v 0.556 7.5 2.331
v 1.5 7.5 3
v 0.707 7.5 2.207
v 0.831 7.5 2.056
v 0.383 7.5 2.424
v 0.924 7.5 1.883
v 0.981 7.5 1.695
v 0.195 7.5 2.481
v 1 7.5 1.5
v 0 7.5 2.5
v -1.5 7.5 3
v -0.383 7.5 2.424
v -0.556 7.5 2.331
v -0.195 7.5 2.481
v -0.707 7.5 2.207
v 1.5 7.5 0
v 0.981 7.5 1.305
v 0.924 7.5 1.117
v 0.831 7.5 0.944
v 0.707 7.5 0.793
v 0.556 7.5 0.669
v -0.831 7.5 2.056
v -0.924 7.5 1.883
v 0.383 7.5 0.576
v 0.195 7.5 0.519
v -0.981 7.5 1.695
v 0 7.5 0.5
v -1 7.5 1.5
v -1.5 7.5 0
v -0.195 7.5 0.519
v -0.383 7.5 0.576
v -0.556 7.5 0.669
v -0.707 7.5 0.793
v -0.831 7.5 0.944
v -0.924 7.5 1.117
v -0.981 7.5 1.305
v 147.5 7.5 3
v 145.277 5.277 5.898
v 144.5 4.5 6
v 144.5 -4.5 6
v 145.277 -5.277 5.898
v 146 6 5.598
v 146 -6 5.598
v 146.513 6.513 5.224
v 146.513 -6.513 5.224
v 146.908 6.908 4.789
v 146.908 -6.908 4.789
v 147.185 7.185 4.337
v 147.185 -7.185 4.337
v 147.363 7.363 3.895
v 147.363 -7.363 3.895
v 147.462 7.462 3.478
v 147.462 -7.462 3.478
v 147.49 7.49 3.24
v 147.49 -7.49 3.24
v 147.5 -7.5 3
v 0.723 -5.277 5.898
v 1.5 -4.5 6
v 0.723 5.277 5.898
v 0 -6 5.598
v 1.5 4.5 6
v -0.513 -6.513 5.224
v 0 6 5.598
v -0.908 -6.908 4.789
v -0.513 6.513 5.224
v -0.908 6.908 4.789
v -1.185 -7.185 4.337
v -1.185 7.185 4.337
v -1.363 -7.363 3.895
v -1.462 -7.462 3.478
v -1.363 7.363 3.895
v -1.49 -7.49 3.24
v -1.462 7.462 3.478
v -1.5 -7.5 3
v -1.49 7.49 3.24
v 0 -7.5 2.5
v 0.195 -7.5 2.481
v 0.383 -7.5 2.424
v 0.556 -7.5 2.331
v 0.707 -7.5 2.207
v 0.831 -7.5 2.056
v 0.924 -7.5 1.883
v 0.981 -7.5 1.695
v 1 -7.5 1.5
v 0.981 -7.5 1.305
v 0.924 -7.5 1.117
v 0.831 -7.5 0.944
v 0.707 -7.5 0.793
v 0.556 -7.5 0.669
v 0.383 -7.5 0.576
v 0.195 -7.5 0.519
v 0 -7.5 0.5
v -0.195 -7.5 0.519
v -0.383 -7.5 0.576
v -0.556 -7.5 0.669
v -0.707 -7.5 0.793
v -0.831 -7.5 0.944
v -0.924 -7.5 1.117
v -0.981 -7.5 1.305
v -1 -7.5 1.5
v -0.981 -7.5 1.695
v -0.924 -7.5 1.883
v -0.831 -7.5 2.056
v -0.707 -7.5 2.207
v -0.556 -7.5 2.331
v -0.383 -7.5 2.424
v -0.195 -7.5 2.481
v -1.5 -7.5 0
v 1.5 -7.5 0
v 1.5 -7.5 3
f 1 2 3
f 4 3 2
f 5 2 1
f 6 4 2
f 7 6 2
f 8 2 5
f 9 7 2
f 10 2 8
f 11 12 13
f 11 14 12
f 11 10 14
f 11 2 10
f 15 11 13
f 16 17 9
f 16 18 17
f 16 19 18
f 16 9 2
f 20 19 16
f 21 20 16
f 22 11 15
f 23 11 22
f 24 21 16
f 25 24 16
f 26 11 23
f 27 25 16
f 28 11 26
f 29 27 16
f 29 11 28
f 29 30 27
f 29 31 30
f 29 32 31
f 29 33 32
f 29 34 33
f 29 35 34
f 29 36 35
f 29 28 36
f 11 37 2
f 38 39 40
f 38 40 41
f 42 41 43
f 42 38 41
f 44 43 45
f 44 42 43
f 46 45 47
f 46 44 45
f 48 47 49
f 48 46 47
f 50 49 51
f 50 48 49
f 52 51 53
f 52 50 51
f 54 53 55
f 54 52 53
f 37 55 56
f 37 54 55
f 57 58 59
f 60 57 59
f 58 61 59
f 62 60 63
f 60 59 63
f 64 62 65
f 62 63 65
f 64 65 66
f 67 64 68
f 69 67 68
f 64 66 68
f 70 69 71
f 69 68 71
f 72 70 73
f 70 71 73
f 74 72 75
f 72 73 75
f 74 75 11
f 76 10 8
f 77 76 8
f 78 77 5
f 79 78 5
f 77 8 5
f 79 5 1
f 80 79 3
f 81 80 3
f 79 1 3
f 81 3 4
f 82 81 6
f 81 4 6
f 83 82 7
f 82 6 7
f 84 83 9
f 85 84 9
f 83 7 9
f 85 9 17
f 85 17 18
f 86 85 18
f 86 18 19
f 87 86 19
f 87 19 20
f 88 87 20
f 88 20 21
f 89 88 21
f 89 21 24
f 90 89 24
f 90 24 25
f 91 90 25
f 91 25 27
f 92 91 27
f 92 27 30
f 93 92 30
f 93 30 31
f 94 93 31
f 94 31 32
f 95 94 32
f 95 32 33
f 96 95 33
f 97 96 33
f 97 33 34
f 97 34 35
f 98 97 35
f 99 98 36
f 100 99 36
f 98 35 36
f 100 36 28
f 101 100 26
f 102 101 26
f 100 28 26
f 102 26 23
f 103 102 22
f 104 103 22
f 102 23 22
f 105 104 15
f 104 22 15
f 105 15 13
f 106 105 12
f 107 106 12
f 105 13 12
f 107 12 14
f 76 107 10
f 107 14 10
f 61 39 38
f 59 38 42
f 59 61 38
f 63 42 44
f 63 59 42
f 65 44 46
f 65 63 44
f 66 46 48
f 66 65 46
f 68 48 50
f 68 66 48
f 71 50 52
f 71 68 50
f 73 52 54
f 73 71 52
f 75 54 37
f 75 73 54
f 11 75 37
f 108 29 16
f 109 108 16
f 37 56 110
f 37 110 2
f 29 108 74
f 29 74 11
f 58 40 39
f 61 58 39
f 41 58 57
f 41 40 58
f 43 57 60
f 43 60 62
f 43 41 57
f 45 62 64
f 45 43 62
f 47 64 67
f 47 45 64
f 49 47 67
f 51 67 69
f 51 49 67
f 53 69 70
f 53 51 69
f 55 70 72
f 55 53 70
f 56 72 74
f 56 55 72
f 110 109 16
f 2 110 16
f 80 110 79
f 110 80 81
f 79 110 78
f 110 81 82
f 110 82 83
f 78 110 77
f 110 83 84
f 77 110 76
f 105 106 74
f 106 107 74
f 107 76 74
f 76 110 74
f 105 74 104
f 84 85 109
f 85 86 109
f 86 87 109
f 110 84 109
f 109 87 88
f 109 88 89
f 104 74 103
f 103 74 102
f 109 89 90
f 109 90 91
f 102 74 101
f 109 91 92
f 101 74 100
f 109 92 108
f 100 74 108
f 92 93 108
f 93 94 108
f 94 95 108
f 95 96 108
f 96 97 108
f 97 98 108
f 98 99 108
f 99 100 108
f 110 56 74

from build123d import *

# Parameters (mm, degrees)
SKETCH_1_W          = 3
SKETCH_1_H          = 15
EXTRUDE_1_DEPTH     = 6
SKETCH_2_W          = 3
SKETCH_2_H          = 15
EXTRUDE_2_DEPTH     = 146
SKETCH_3_R          = 1
CUT_EXTRUDE_1_DEPTH = 146
FILLET_1_R          = 3


with BuildPart() as part:
    # 草图1 → 凸台-拉伸1 (new body)
    with BuildSketch(Plane.XY):
        Rectangle(SKETCH_1_W, SKETCH_1_H)
    extrude(amount=EXTRUDE_1_DEPTH)

    # 草图2 → 凸台-拉伸2 (add)
    with BuildSketch(Plane(origin=(1.5, 0, 0), x_dir=(0, 0, -1), z_dir=(1, 0, 0))):
        with Locations((-4.5, 0)):
            Rectangle(SKETCH_2_W, SKETCH_2_H)
    extrude(amount=EXTRUDE_2_DEPTH)

    # 草图3 → 切除-拉伸1 (cut)
    with BuildSketch(Plane(origin=(0, 7.5, 0), x_dir=(1, 0, 0), z_dir=(0, 1, 0))):
        with Locations(Location((0, -1.5, 0), (0, 0, 270))):
            Circle(SKETCH_3_R)
    extrude(amount=-CUT_EXTRUDE_1_DEPTH, mode=Mode.SUBTRACT)

    # 圆角1
    fillet_1_edges = [part.edges().sort_by_distance(p)[0] for p in [
        (-1.5, 0, 6),
        (73, 7.5, 6),
        (147.5, 0, 6),
        (73, -7.5, 6),
    ]]
    fillet(fillet_1_edges, radius=FILLET_1_R - 0.0001)  # a hair under: the kernel refuses the full size


solid = part.part
